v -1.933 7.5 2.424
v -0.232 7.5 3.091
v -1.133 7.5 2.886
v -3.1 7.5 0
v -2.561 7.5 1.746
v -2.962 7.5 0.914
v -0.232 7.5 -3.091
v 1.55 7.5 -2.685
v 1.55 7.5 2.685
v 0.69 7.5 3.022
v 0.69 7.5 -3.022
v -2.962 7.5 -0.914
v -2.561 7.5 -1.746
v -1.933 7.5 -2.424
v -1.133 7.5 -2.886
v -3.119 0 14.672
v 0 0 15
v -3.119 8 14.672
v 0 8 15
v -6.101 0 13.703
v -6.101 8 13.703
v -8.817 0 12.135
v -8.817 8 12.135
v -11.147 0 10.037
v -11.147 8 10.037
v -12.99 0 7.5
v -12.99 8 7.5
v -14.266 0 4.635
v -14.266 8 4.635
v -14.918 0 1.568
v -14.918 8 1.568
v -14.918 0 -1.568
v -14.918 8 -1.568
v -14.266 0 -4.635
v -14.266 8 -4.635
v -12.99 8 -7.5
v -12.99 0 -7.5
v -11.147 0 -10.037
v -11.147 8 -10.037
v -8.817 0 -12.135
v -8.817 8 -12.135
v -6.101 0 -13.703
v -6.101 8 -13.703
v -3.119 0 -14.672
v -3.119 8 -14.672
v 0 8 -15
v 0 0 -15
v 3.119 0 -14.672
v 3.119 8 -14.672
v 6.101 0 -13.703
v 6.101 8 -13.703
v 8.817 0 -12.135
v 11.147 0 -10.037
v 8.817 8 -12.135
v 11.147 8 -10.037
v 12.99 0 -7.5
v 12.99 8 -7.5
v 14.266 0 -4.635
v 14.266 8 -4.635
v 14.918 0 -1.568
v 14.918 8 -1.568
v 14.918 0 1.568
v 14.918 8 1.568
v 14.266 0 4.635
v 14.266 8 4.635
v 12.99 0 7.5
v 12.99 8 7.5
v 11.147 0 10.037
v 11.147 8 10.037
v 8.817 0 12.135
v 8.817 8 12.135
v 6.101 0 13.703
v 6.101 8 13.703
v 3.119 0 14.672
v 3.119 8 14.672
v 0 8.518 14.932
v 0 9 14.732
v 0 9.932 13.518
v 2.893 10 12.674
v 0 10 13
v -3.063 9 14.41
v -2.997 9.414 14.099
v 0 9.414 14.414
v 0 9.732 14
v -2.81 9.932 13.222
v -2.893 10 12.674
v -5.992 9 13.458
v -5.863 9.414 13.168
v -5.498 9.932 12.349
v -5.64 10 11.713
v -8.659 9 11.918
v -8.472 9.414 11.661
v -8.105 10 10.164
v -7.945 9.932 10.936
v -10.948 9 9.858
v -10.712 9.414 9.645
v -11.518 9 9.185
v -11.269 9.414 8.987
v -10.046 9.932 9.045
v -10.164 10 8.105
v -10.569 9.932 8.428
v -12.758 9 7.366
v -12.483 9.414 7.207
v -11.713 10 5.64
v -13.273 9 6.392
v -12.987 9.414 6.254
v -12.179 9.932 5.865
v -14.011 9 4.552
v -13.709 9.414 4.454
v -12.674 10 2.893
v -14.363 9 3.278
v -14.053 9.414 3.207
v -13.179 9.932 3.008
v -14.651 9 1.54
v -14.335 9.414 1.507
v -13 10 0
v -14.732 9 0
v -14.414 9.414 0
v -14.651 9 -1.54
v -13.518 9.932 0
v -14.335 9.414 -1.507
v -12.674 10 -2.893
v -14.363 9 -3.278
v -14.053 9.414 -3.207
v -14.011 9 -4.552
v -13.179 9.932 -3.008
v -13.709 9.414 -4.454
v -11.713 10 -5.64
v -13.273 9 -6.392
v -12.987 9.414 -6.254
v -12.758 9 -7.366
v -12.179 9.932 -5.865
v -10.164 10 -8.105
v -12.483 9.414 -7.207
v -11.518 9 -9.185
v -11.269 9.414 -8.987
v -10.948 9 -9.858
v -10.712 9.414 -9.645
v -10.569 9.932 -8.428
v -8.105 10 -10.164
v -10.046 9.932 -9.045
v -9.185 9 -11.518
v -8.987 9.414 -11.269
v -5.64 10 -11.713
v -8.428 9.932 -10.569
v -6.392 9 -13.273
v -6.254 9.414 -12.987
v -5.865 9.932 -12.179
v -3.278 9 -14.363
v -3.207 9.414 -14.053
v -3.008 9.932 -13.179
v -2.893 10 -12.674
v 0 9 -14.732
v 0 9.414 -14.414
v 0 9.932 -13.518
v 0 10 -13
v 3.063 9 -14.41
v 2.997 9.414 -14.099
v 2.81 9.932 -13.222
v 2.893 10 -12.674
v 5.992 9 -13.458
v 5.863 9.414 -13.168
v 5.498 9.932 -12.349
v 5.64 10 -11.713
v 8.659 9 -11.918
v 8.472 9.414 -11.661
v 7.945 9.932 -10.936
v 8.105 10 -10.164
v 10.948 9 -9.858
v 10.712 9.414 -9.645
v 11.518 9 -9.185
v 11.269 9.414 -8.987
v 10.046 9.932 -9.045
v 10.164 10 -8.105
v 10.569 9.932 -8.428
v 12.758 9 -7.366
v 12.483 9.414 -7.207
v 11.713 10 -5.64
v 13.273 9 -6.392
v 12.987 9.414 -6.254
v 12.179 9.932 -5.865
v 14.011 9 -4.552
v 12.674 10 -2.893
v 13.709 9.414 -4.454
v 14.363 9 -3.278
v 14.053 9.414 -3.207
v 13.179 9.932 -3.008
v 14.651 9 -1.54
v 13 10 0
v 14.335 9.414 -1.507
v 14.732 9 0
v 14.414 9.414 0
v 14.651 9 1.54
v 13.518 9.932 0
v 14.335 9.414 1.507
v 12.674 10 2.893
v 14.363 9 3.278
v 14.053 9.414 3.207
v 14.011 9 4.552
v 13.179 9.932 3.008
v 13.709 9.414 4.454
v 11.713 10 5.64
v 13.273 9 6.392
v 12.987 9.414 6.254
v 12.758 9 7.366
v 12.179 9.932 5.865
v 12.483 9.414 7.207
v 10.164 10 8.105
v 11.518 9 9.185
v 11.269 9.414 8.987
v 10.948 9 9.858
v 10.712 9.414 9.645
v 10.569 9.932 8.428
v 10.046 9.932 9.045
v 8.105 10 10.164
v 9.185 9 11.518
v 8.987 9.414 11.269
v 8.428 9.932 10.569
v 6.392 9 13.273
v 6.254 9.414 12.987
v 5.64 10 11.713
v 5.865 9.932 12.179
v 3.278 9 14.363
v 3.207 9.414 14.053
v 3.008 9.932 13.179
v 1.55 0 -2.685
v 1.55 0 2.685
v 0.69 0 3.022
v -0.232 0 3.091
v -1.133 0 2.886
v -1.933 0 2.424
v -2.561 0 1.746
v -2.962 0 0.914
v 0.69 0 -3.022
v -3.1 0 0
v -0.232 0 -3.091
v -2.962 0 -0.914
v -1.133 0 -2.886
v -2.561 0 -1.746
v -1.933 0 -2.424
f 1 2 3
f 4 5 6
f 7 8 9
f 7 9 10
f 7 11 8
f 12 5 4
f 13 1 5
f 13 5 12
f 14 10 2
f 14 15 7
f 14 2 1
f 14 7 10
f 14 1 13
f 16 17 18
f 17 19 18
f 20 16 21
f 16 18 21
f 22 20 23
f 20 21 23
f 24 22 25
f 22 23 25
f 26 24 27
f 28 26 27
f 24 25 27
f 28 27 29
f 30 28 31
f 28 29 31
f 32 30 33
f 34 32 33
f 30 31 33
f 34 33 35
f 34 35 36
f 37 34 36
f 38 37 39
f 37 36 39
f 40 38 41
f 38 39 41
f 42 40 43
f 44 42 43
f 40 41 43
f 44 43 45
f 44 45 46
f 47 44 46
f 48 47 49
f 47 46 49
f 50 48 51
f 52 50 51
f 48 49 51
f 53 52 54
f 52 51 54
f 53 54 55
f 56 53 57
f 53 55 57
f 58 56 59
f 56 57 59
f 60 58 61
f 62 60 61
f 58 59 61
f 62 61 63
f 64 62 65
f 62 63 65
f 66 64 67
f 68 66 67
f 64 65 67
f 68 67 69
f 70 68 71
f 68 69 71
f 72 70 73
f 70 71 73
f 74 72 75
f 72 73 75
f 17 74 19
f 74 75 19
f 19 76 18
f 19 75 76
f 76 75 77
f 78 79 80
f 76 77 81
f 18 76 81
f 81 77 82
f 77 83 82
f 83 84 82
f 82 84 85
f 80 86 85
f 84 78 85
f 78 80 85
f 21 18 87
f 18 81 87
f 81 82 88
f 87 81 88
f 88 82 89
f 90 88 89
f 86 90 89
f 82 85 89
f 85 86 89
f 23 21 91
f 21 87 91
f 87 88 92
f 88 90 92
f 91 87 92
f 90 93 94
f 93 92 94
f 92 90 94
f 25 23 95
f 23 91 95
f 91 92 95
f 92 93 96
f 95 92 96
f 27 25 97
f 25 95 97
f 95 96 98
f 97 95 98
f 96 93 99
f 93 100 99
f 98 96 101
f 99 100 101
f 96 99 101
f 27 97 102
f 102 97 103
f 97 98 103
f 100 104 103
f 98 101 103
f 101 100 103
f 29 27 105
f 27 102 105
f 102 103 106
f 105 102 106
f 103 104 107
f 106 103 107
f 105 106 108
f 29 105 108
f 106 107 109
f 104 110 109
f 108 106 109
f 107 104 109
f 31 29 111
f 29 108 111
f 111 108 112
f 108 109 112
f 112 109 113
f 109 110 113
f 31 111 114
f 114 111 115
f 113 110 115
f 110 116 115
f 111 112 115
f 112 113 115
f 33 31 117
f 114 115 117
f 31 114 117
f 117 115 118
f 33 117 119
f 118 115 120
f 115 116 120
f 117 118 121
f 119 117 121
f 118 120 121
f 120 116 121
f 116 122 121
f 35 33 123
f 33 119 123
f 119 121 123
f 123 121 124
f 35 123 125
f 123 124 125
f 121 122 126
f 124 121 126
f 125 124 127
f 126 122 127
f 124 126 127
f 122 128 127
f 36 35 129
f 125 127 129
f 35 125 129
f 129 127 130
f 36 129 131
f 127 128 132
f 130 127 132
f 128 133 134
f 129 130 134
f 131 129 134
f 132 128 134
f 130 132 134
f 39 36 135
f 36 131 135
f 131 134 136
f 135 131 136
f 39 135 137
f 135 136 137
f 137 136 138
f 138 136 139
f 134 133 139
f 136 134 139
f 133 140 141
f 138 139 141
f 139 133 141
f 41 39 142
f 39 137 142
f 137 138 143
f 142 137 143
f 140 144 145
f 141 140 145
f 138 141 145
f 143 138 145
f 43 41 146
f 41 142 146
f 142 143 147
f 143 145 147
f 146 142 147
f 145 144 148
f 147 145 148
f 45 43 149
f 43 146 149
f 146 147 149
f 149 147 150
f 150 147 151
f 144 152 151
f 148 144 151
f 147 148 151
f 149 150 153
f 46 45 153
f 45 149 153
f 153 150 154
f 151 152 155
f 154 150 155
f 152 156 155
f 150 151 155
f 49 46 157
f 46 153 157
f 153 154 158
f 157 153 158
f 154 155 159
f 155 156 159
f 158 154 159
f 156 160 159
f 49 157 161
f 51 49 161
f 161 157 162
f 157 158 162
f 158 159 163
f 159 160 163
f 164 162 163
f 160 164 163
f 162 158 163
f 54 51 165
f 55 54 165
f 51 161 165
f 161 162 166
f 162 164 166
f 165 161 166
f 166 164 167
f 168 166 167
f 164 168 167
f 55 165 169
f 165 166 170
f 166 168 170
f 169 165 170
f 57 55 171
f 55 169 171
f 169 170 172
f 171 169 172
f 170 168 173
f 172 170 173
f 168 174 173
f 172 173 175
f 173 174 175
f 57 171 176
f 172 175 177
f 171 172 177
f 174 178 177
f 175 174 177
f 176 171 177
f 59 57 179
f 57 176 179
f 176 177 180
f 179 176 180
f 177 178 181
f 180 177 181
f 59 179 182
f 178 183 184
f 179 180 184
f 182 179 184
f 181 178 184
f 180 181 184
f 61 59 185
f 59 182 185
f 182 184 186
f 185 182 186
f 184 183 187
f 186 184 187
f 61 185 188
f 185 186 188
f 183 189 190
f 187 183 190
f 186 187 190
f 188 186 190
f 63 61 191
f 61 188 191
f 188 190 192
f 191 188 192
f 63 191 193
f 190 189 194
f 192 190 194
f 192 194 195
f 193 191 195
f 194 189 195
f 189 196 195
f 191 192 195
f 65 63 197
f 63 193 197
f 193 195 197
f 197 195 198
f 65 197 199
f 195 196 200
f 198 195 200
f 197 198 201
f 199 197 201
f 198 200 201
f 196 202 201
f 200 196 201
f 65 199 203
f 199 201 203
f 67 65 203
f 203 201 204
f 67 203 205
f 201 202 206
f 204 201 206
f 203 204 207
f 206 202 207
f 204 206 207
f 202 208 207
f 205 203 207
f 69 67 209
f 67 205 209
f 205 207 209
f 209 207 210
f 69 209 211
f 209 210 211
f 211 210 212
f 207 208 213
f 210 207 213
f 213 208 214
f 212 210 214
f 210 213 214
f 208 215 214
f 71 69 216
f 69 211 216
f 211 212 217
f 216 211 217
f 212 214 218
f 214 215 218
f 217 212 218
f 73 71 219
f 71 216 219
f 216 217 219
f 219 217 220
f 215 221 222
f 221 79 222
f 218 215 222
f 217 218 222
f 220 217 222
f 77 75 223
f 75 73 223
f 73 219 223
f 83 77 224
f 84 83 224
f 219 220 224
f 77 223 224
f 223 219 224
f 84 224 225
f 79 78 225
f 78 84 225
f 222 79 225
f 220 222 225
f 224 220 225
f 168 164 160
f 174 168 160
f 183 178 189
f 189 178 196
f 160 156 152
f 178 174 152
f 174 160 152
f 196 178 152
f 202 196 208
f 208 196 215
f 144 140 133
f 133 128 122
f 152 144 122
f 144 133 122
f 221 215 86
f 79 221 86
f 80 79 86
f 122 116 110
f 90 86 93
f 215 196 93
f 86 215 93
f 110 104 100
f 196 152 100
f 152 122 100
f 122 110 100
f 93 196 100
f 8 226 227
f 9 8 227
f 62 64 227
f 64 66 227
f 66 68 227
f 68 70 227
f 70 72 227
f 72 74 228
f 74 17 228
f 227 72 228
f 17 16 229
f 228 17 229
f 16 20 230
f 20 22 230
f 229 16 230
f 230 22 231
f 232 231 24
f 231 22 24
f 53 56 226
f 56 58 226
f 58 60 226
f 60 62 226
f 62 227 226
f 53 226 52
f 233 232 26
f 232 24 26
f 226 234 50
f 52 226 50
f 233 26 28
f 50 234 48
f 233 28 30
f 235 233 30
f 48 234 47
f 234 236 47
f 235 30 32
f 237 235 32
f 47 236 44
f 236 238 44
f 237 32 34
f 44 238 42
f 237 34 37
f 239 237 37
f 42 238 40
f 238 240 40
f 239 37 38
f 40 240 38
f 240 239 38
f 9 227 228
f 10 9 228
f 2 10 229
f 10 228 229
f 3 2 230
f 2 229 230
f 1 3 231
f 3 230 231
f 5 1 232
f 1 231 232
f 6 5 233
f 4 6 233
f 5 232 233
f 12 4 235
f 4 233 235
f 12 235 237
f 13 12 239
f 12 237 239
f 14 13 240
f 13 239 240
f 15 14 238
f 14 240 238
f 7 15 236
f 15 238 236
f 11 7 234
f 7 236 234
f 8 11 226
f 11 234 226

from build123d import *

# Parameters (mm, degrees)
CUT_EXTRUDE2_DEPTH = 7.5


with BuildPart() as part:
    # Sketch2 → Revolve1 (revolve)
    with BuildSketch(Plane(origin=(0, 0, 0), x_dir=(0, 0, -1), z_dir=(1, 0, 0))):
        with BuildLine():
            ThreePointArc((-15, 8), (-14.414213562, 9.414213562), (-13, 10))
            Line((-13, 10), (0, 10))
            Line((0, 10), (0, 0))
            Line((0, 0), (-15, 0))
            Line((-15, 0), (-15, 8))
        make_face()
    revolve(axis=Axis((0, 10, 0), (0, -1, 0)))

    # Sketch1 → Cut-Extrude2 (cut)
    with BuildSketch(Plane(origin=(0, 0, 0), x_dir=(1, 0, 0), z_dir=(0, 1, 0))):
        with BuildLine():
            Line((1.55, 2.684678752), (1.55, -2.684678752))
            ThreePointArc((1.55, -2.684678752), (-3.1, 0), (1.55, 2.684678752))
        make_face()
    extrude(amount=CUT_EXTRUDE2_DEPTH, mode=Mode.SUBTRACT)


solid = part.part
